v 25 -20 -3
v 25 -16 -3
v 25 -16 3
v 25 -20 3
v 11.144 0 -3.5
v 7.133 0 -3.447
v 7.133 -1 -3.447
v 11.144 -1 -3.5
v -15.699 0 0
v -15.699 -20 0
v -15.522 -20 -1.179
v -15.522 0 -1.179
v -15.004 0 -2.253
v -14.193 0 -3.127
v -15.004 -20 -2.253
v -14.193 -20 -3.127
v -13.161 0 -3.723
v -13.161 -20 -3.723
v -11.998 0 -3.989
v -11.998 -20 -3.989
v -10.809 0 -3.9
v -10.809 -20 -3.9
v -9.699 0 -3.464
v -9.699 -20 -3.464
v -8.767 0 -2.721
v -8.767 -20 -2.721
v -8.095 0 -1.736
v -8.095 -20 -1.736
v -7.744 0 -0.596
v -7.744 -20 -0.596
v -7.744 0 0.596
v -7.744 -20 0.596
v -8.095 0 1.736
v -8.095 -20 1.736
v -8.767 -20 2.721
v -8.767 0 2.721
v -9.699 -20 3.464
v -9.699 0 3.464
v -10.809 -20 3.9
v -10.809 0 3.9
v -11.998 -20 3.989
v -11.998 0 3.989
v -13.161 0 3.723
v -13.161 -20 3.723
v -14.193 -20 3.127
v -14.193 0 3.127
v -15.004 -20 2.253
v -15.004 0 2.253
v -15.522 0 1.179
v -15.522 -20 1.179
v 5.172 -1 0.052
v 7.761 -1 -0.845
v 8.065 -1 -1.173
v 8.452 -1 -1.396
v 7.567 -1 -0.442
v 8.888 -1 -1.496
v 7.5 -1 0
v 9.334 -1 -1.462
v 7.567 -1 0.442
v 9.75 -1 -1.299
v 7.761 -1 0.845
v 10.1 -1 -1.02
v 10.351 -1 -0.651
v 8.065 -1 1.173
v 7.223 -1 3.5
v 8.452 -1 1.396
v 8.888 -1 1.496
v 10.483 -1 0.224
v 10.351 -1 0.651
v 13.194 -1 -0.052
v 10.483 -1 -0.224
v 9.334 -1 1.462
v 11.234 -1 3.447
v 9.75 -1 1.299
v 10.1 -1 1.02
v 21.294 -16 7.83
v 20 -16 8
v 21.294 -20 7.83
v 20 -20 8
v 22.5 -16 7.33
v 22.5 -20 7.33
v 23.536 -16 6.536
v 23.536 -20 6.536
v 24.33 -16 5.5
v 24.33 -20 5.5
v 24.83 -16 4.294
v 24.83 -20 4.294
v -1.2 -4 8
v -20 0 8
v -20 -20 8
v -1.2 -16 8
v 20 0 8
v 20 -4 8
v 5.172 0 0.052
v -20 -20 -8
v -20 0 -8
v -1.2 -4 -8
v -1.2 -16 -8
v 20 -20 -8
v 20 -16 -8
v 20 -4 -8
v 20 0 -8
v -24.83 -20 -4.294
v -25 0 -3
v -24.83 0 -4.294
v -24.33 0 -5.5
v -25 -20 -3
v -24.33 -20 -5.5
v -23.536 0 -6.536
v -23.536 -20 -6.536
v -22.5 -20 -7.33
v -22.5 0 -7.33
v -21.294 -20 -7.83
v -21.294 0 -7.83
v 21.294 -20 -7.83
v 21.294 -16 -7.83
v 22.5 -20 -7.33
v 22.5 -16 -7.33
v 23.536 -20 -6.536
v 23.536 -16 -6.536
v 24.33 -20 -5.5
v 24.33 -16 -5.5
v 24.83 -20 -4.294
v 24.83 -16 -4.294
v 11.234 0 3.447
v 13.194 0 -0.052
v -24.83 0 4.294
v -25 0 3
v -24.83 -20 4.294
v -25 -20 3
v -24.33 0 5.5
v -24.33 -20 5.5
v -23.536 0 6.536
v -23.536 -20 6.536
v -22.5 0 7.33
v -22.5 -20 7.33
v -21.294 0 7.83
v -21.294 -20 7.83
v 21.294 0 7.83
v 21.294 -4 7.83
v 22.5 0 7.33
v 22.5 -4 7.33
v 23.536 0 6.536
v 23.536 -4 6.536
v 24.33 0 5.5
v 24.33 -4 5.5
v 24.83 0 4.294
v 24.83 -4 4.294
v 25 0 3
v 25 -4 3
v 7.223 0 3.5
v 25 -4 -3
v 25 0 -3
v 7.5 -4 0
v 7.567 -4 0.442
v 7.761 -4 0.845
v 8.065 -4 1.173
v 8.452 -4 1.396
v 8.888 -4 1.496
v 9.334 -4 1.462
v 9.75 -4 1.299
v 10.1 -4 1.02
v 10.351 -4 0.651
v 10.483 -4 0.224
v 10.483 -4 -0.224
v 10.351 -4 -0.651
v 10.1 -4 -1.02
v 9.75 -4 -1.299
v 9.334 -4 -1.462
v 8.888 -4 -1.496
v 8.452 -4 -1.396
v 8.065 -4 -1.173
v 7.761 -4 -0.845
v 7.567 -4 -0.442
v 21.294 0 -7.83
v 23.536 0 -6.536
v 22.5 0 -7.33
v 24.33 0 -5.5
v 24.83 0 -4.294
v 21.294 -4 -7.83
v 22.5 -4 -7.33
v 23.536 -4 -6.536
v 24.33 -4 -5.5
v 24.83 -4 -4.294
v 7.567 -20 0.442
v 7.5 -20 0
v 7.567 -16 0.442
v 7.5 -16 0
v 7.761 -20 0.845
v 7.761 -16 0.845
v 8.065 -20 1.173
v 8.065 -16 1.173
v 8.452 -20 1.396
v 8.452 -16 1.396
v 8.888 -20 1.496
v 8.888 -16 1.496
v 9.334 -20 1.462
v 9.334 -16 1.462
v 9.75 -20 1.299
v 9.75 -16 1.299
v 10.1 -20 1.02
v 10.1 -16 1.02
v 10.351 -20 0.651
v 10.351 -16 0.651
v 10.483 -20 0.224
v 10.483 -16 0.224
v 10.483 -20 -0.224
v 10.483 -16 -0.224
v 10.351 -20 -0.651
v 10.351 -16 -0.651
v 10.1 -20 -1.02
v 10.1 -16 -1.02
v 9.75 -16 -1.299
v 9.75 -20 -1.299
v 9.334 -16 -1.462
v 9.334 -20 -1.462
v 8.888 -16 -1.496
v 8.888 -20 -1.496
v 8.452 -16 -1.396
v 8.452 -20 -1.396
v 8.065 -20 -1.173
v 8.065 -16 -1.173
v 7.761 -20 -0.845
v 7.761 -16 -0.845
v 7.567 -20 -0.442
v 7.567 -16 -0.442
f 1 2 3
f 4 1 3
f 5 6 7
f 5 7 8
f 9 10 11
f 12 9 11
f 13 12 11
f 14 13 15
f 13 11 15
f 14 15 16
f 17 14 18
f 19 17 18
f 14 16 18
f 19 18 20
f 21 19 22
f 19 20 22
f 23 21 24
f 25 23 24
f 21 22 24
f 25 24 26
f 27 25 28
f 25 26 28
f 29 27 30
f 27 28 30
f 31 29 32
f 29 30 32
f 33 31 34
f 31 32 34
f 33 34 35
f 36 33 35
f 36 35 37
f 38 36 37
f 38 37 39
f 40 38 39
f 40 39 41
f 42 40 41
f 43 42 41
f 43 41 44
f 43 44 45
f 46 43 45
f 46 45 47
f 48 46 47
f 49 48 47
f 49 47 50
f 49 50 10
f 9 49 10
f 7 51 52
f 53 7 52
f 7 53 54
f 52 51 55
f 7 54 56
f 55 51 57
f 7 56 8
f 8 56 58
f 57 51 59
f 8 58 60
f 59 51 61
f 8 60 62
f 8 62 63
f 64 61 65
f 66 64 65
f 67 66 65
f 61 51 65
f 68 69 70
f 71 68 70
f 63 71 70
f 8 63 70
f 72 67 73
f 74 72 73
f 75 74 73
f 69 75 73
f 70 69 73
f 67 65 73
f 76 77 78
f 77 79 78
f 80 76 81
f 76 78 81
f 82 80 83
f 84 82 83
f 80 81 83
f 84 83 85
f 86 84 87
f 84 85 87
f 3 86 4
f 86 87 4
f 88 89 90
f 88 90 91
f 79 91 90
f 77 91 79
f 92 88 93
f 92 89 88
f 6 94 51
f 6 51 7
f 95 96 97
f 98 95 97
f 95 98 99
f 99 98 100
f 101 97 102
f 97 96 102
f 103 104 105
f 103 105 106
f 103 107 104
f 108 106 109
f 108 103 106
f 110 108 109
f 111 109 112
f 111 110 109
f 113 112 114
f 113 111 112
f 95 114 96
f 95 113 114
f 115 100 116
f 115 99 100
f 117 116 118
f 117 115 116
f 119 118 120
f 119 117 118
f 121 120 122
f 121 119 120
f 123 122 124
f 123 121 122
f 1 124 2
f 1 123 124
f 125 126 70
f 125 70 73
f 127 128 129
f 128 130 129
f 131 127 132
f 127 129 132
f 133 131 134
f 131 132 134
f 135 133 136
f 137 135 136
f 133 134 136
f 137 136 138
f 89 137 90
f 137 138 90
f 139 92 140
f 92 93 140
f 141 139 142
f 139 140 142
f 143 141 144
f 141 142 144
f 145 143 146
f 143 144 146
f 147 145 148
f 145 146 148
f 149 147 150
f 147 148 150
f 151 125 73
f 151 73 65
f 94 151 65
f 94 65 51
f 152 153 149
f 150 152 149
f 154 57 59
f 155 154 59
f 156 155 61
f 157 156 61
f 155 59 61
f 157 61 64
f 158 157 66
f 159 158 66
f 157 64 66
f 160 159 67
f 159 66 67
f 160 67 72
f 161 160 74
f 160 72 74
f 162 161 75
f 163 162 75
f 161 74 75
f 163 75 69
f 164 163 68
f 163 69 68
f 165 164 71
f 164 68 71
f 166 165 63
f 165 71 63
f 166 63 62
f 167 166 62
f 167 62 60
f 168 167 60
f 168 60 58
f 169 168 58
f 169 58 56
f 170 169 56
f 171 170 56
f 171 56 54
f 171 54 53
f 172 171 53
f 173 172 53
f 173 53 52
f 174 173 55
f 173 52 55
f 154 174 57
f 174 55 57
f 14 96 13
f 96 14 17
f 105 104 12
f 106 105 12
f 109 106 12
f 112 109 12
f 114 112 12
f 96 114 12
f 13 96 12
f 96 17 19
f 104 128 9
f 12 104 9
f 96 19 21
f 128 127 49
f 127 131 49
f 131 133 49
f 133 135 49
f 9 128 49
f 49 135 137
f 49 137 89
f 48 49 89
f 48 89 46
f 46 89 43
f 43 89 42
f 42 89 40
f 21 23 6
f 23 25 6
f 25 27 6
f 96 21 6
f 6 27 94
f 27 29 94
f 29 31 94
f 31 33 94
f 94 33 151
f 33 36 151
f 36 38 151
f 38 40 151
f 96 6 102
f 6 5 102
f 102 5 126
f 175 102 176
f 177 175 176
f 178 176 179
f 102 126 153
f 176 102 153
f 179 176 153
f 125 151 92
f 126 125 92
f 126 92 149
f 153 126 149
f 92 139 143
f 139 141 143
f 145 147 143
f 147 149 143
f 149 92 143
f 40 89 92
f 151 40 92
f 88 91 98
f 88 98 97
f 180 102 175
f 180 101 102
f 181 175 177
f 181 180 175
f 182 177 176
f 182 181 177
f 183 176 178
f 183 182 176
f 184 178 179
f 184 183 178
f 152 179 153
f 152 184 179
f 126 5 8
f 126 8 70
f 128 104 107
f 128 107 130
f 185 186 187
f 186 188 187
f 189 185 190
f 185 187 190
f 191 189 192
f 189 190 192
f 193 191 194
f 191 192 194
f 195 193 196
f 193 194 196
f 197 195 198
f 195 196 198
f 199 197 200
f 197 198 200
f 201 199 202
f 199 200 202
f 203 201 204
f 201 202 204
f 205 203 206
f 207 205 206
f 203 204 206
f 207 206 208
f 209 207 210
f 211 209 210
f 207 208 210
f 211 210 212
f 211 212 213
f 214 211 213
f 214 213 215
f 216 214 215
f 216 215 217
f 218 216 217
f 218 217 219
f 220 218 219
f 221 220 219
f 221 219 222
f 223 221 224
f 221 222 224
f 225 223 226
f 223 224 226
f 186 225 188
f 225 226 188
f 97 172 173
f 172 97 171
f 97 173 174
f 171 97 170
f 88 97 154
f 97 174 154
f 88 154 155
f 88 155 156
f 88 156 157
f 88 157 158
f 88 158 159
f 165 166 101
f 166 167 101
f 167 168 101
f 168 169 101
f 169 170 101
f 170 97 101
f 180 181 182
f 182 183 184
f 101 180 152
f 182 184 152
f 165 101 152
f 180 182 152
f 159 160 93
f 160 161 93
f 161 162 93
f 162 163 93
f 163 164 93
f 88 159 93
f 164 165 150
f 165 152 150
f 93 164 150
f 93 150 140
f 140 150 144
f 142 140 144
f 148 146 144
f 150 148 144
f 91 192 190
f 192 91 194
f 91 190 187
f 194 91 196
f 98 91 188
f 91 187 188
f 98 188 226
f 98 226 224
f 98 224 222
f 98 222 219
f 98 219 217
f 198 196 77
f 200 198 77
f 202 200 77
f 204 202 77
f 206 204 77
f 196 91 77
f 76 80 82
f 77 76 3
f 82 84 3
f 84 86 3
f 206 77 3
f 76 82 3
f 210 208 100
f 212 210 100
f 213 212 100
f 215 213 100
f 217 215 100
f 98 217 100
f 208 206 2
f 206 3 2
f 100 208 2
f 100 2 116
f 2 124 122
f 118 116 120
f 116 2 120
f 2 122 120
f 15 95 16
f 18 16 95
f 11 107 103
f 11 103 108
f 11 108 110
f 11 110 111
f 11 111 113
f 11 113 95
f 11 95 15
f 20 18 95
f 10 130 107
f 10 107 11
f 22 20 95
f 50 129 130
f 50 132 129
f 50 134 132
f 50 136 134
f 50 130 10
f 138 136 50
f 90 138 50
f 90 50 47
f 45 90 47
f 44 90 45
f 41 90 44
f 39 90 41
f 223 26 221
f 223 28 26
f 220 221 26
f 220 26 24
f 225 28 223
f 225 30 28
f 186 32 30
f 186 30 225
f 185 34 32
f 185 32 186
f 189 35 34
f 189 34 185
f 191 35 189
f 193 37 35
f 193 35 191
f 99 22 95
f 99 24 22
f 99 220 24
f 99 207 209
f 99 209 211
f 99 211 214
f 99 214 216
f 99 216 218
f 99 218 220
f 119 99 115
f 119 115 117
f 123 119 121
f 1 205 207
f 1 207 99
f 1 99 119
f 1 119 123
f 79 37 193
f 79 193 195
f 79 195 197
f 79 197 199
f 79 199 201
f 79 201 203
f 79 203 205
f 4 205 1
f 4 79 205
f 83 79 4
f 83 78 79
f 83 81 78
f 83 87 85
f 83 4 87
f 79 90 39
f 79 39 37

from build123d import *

# Parameters (mm, degrees)
F0_W      = 50
F0_H      = 16
F2_DEPTH  = 20
F3_D      = 8
F3_DEPTH  = 20
F5_D      = 3
F5_DEPTH  = 20
F7_DEPTH  = 26.2
F8_R      = 5
F10_DEPTH = 1


with BuildPart() as f2:
    # F0 (on Front) → F2 (new body)
    with BuildSketch(Plane.XZ):
        Rectangle(F0_W, F0_H)
    extrude(amount=F2_DEPTH)

    # F3
    with Locations(Plane(origin=(0, 0, 0), x_dir=(1, 0, 0), z_dir=(0, 1, 0))):
        with Locations((-11.699282, 0)):
            Hole(F3_D / 2, depth=F3_DEPTH)

    # F5
    with Locations(Plane.XZ.offset(20)):
        with Locations((9, 0)):
            Hole(F5_D / 2, depth=F5_DEPTH)

    # F6 (on face) → F7 (cut)
    with BuildSketch(Plane.YZ.offset(25)):
        Polygon((-16, 8), (-16, 0), (-16, -8), (-4, -8), (-4, 0), (-4, 8), align=None)
    extrude(amount=-F7_DEPTH, mode=Mode.SUBTRACT)

    # F8
    f8_edges = [f2.edges().sort_by_distance(p)[0] for p in [
        (25, -18, 8),
        (25, -2, 8),
        (25, -2, -8),
        (25, -18, -8),
        (-25, -10, -8),
        (-25, -10, 8),
    ]]
    fillet(f8_edges, radius=F8_R)

    # F9 (on Front) → F10 (cut)
    with BuildSketch(Plane.XZ):
        Polygon((11.143559, -3.499542), (13.194126, -0.052143), (11.233874, 3.447399), (7.223055, 3.499542), (5.172489, 0.052143), (7.132741, -3.447399), align=None)
    extrude(amount=F10_DEPTH, mode=Mode.SUBTRACT)


solid = f2.part
